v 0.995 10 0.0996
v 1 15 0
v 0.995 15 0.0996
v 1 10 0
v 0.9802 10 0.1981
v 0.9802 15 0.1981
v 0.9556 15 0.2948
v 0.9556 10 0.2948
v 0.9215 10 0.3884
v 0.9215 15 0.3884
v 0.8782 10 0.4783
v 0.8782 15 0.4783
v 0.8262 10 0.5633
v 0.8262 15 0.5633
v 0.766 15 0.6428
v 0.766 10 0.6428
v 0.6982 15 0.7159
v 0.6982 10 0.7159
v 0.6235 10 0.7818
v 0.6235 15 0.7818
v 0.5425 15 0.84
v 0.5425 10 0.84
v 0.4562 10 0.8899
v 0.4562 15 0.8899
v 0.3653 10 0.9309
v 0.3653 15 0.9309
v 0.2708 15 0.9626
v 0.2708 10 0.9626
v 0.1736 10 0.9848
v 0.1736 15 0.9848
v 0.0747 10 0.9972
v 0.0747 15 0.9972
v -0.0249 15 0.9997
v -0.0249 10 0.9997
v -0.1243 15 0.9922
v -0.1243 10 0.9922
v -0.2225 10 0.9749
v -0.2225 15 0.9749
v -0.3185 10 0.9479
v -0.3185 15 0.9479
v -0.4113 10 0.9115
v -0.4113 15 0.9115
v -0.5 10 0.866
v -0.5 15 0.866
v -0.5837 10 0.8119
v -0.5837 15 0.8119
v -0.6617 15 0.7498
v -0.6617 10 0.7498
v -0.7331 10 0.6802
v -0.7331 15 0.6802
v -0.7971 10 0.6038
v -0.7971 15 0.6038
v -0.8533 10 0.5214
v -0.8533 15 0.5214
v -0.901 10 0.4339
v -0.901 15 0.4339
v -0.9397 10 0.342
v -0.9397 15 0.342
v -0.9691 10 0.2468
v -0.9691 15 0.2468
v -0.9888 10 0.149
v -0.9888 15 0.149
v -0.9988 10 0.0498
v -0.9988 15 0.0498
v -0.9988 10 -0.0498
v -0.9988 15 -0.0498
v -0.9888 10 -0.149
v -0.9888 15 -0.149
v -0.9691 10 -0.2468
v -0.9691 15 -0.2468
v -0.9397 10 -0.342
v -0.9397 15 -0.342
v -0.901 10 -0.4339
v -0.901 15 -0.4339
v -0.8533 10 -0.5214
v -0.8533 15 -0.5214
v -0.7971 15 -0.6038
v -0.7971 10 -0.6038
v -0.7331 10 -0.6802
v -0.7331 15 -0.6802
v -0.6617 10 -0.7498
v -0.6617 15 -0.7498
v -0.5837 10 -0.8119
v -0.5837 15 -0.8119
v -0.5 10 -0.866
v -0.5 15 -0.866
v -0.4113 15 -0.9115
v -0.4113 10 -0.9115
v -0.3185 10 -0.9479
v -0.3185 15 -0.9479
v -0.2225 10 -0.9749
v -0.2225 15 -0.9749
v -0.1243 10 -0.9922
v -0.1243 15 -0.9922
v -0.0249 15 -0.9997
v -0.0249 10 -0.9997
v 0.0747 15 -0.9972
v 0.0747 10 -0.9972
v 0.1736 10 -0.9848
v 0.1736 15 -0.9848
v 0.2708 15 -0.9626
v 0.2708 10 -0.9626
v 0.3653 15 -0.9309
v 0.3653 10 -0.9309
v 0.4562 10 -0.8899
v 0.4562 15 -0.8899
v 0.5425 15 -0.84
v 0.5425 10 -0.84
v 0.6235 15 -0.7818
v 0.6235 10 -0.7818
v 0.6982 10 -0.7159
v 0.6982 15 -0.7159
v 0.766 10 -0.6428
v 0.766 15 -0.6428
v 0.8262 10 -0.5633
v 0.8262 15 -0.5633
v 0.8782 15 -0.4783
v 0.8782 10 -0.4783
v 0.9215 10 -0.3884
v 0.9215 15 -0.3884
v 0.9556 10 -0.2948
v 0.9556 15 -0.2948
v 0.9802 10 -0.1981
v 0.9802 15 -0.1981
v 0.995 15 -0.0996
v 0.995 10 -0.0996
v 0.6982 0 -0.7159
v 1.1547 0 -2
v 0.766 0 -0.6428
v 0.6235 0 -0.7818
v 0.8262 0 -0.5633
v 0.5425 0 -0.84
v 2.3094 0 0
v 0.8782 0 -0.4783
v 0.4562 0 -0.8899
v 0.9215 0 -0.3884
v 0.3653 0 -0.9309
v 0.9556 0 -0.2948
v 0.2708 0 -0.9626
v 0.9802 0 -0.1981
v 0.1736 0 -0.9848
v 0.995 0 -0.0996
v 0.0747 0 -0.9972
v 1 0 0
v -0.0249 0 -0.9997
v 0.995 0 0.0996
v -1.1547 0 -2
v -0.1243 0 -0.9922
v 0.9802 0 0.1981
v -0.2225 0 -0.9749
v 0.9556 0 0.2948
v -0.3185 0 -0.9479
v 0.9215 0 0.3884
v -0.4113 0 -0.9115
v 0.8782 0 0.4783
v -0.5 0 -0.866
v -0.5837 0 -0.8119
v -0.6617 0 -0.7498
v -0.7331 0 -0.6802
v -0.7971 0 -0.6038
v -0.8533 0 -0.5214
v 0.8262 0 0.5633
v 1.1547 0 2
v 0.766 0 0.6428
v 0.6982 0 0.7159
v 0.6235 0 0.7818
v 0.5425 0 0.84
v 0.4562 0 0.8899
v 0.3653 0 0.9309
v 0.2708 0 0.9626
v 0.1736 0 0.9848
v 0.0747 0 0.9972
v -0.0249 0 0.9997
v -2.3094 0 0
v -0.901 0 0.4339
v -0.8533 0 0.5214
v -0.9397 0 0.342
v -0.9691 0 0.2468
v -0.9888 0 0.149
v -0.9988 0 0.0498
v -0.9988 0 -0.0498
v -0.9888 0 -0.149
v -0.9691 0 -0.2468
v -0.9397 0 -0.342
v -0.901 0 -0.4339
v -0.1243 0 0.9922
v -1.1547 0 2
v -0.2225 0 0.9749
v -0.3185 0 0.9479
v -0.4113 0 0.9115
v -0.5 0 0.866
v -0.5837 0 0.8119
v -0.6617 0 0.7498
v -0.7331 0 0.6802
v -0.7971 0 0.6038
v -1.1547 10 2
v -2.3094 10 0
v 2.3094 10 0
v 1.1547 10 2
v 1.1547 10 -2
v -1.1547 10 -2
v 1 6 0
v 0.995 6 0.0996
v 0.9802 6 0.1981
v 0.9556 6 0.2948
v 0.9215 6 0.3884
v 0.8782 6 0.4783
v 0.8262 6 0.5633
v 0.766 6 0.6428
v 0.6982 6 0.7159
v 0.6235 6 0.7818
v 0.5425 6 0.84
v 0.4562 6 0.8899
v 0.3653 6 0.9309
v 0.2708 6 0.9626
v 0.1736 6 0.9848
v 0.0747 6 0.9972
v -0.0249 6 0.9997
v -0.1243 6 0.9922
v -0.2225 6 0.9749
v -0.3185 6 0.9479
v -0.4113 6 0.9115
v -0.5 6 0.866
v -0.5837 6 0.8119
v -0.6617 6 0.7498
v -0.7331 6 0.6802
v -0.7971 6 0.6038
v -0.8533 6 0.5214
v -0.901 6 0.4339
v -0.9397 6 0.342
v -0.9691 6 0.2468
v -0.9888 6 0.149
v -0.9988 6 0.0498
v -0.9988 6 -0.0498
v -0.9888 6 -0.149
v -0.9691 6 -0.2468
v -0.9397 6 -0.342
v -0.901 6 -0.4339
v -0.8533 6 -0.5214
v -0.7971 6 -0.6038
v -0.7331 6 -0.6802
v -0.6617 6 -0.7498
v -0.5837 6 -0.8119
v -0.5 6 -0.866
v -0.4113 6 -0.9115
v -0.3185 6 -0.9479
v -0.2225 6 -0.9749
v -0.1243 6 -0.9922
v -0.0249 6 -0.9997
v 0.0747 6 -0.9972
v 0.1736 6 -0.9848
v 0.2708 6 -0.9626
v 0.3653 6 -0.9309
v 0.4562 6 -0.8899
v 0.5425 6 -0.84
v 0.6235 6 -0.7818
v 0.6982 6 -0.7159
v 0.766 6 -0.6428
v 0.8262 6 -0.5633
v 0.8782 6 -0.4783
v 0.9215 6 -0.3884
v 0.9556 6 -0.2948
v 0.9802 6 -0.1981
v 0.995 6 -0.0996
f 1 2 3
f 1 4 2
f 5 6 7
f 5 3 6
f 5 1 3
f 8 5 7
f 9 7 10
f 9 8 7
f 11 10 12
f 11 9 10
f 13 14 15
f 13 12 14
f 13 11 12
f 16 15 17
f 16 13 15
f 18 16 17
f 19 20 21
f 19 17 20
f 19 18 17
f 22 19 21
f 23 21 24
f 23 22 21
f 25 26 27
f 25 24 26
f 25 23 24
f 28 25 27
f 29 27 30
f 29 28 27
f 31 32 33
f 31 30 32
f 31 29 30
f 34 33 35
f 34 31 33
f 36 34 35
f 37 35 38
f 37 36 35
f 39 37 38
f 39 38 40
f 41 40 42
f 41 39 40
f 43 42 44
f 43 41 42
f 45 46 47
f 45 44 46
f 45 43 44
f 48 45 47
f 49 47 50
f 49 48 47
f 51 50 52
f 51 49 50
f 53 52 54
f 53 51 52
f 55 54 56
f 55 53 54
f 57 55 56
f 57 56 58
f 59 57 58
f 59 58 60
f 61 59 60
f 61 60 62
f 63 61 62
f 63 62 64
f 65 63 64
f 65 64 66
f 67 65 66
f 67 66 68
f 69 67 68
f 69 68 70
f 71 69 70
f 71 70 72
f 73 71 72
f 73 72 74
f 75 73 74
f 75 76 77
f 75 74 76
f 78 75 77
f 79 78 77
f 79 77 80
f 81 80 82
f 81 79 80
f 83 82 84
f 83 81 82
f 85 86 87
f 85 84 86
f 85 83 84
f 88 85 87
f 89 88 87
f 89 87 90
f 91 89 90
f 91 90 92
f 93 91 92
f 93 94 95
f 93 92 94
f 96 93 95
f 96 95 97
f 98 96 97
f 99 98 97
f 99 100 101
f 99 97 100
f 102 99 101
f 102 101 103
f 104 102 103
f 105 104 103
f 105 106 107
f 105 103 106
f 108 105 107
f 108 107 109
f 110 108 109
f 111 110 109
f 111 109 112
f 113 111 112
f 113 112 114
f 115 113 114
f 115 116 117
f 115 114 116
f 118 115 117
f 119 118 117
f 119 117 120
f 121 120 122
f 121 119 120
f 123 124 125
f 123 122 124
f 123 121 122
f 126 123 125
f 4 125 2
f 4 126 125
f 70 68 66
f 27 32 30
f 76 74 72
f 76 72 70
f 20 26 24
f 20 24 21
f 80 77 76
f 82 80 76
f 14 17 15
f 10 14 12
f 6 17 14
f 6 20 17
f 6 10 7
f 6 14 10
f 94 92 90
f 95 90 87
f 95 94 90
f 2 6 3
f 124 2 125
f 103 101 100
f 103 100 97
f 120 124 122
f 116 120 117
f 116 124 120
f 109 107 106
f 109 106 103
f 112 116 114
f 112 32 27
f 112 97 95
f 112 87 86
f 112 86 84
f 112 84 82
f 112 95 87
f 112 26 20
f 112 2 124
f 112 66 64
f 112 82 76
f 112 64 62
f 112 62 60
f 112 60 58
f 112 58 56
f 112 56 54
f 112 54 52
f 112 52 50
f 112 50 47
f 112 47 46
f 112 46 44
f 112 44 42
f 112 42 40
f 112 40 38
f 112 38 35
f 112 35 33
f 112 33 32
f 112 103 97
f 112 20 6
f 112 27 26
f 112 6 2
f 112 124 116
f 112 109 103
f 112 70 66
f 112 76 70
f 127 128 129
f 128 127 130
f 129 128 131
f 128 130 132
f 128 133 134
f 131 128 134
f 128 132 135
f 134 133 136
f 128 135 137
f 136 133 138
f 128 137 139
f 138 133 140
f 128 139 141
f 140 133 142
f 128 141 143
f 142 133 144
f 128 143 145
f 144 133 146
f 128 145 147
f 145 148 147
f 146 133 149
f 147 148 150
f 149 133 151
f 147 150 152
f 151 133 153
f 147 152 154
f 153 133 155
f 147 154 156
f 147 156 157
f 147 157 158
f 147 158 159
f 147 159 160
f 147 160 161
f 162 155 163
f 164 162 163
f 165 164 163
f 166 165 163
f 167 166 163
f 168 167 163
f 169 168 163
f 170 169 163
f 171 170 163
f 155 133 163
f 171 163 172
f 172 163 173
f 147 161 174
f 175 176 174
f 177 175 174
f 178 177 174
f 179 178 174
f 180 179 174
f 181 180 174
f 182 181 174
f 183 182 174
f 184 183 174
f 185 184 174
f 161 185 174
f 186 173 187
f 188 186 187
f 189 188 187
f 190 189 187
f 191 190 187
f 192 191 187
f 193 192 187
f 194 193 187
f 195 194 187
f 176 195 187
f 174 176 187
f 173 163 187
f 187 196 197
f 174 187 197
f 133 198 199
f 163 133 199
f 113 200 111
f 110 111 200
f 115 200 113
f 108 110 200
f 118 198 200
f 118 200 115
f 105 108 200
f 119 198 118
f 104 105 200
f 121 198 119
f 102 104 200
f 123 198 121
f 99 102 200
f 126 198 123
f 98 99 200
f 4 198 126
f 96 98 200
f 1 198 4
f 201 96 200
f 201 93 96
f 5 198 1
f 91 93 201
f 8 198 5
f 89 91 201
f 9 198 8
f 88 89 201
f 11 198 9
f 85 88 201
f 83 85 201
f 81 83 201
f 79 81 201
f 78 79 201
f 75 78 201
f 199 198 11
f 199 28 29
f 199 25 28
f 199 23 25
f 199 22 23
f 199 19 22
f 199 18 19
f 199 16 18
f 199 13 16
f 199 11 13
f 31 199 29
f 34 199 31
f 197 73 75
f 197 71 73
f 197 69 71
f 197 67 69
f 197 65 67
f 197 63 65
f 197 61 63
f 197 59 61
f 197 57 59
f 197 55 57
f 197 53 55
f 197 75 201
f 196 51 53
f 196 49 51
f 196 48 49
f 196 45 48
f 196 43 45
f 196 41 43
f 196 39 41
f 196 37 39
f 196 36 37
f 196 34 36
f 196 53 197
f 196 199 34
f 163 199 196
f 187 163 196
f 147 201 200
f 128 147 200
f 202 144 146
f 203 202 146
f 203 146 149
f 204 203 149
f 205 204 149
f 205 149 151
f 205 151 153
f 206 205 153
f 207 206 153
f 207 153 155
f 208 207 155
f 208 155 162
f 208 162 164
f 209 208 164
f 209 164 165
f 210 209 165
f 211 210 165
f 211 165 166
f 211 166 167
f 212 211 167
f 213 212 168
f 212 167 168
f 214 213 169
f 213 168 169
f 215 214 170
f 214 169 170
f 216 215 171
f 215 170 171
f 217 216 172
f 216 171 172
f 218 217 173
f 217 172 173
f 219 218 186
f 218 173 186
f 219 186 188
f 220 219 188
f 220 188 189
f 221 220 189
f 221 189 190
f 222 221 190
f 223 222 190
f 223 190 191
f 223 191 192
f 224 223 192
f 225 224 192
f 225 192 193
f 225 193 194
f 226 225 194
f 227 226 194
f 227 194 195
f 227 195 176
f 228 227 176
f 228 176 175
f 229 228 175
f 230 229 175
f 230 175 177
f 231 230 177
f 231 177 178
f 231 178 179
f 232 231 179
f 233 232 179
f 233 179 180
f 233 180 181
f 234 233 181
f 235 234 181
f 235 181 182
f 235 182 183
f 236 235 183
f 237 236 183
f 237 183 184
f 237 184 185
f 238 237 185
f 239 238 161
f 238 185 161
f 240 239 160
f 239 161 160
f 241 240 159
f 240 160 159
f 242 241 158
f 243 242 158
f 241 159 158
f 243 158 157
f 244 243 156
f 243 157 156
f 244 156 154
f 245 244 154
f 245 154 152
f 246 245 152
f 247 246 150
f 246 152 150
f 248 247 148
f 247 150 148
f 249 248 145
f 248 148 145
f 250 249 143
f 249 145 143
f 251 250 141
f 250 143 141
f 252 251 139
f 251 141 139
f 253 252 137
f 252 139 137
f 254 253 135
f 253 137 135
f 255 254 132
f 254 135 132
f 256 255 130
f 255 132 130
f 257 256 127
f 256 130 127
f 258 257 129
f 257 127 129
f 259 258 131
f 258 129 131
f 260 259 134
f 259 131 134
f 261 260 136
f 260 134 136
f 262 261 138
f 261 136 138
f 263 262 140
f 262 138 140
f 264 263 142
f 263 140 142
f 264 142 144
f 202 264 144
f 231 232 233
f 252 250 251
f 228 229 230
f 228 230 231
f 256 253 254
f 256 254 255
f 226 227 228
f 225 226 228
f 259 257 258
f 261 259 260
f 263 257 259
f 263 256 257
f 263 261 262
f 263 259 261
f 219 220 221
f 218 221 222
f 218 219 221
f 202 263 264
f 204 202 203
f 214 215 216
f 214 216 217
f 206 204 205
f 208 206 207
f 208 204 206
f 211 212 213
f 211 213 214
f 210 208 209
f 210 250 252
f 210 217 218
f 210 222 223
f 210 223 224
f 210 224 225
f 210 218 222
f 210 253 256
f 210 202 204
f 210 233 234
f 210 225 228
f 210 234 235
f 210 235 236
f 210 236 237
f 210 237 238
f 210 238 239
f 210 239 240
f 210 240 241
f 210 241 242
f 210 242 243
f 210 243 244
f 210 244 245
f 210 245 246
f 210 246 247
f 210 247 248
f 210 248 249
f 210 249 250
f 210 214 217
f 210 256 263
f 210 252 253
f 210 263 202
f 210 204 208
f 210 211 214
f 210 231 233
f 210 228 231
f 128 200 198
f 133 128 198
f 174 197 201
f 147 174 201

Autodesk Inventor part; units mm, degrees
ref_plane "YZ Plane" through (0, 0, 0) normal (1, 0, 0) x (0, 1, 0)
ref_plane "XZ Plane" through (0, 0, 0) normal (0, 1, 0) x (-1, 0, 0)
ref_plane "XY Plane" through (0, 0, 0) normal (0, 0, 1) x (1, 0, 0)
sketch "Sketch1" plane through (0, 0, 0) normal (0, 1, 0) x (-1, 0, 0)
  line L0 (2.3094, 0) -> (1.1547, -2)
  line L1 (1.1547, -2) -> (-1.1547, -2)
  line L2 (-1.1547, -2) -> (-2.3094, 0)
  line L3 (-2.3094, 0) -> (-1.1547, 2)
  line L4 (-1.1547, 2) -> (1.1547, 2)
  line L5 (1.1547, 2) -> (2.3094, 0)
  point P0 (0, 0)
  point P1 (0, 0)
  dimension "d0" = 4
extrude "Extrusion1" add sketch "Sketch1" along normal blind 10
sketch "Sketch2" plane through (0, 10, 0) normal (0, 1, 0) x (1, 0, 0)
  circle A0 centre (0, 0) radius 1
  dimension "d3" = 2
extrude "Extrusion2" add sketch "Sketch2" along normal blind 5
sketch "Sketch3" plane through (0, 0, 0) normal (0, -1, 0) x (1, 0, 0)
  circle A0 centre (0, 0) radius 1
  dimension "d6" = 2
extrude "Extrusion3" cut sketch "Sketch3" against normal blind 6
properties part number "M2x12 HEX SPACER"
